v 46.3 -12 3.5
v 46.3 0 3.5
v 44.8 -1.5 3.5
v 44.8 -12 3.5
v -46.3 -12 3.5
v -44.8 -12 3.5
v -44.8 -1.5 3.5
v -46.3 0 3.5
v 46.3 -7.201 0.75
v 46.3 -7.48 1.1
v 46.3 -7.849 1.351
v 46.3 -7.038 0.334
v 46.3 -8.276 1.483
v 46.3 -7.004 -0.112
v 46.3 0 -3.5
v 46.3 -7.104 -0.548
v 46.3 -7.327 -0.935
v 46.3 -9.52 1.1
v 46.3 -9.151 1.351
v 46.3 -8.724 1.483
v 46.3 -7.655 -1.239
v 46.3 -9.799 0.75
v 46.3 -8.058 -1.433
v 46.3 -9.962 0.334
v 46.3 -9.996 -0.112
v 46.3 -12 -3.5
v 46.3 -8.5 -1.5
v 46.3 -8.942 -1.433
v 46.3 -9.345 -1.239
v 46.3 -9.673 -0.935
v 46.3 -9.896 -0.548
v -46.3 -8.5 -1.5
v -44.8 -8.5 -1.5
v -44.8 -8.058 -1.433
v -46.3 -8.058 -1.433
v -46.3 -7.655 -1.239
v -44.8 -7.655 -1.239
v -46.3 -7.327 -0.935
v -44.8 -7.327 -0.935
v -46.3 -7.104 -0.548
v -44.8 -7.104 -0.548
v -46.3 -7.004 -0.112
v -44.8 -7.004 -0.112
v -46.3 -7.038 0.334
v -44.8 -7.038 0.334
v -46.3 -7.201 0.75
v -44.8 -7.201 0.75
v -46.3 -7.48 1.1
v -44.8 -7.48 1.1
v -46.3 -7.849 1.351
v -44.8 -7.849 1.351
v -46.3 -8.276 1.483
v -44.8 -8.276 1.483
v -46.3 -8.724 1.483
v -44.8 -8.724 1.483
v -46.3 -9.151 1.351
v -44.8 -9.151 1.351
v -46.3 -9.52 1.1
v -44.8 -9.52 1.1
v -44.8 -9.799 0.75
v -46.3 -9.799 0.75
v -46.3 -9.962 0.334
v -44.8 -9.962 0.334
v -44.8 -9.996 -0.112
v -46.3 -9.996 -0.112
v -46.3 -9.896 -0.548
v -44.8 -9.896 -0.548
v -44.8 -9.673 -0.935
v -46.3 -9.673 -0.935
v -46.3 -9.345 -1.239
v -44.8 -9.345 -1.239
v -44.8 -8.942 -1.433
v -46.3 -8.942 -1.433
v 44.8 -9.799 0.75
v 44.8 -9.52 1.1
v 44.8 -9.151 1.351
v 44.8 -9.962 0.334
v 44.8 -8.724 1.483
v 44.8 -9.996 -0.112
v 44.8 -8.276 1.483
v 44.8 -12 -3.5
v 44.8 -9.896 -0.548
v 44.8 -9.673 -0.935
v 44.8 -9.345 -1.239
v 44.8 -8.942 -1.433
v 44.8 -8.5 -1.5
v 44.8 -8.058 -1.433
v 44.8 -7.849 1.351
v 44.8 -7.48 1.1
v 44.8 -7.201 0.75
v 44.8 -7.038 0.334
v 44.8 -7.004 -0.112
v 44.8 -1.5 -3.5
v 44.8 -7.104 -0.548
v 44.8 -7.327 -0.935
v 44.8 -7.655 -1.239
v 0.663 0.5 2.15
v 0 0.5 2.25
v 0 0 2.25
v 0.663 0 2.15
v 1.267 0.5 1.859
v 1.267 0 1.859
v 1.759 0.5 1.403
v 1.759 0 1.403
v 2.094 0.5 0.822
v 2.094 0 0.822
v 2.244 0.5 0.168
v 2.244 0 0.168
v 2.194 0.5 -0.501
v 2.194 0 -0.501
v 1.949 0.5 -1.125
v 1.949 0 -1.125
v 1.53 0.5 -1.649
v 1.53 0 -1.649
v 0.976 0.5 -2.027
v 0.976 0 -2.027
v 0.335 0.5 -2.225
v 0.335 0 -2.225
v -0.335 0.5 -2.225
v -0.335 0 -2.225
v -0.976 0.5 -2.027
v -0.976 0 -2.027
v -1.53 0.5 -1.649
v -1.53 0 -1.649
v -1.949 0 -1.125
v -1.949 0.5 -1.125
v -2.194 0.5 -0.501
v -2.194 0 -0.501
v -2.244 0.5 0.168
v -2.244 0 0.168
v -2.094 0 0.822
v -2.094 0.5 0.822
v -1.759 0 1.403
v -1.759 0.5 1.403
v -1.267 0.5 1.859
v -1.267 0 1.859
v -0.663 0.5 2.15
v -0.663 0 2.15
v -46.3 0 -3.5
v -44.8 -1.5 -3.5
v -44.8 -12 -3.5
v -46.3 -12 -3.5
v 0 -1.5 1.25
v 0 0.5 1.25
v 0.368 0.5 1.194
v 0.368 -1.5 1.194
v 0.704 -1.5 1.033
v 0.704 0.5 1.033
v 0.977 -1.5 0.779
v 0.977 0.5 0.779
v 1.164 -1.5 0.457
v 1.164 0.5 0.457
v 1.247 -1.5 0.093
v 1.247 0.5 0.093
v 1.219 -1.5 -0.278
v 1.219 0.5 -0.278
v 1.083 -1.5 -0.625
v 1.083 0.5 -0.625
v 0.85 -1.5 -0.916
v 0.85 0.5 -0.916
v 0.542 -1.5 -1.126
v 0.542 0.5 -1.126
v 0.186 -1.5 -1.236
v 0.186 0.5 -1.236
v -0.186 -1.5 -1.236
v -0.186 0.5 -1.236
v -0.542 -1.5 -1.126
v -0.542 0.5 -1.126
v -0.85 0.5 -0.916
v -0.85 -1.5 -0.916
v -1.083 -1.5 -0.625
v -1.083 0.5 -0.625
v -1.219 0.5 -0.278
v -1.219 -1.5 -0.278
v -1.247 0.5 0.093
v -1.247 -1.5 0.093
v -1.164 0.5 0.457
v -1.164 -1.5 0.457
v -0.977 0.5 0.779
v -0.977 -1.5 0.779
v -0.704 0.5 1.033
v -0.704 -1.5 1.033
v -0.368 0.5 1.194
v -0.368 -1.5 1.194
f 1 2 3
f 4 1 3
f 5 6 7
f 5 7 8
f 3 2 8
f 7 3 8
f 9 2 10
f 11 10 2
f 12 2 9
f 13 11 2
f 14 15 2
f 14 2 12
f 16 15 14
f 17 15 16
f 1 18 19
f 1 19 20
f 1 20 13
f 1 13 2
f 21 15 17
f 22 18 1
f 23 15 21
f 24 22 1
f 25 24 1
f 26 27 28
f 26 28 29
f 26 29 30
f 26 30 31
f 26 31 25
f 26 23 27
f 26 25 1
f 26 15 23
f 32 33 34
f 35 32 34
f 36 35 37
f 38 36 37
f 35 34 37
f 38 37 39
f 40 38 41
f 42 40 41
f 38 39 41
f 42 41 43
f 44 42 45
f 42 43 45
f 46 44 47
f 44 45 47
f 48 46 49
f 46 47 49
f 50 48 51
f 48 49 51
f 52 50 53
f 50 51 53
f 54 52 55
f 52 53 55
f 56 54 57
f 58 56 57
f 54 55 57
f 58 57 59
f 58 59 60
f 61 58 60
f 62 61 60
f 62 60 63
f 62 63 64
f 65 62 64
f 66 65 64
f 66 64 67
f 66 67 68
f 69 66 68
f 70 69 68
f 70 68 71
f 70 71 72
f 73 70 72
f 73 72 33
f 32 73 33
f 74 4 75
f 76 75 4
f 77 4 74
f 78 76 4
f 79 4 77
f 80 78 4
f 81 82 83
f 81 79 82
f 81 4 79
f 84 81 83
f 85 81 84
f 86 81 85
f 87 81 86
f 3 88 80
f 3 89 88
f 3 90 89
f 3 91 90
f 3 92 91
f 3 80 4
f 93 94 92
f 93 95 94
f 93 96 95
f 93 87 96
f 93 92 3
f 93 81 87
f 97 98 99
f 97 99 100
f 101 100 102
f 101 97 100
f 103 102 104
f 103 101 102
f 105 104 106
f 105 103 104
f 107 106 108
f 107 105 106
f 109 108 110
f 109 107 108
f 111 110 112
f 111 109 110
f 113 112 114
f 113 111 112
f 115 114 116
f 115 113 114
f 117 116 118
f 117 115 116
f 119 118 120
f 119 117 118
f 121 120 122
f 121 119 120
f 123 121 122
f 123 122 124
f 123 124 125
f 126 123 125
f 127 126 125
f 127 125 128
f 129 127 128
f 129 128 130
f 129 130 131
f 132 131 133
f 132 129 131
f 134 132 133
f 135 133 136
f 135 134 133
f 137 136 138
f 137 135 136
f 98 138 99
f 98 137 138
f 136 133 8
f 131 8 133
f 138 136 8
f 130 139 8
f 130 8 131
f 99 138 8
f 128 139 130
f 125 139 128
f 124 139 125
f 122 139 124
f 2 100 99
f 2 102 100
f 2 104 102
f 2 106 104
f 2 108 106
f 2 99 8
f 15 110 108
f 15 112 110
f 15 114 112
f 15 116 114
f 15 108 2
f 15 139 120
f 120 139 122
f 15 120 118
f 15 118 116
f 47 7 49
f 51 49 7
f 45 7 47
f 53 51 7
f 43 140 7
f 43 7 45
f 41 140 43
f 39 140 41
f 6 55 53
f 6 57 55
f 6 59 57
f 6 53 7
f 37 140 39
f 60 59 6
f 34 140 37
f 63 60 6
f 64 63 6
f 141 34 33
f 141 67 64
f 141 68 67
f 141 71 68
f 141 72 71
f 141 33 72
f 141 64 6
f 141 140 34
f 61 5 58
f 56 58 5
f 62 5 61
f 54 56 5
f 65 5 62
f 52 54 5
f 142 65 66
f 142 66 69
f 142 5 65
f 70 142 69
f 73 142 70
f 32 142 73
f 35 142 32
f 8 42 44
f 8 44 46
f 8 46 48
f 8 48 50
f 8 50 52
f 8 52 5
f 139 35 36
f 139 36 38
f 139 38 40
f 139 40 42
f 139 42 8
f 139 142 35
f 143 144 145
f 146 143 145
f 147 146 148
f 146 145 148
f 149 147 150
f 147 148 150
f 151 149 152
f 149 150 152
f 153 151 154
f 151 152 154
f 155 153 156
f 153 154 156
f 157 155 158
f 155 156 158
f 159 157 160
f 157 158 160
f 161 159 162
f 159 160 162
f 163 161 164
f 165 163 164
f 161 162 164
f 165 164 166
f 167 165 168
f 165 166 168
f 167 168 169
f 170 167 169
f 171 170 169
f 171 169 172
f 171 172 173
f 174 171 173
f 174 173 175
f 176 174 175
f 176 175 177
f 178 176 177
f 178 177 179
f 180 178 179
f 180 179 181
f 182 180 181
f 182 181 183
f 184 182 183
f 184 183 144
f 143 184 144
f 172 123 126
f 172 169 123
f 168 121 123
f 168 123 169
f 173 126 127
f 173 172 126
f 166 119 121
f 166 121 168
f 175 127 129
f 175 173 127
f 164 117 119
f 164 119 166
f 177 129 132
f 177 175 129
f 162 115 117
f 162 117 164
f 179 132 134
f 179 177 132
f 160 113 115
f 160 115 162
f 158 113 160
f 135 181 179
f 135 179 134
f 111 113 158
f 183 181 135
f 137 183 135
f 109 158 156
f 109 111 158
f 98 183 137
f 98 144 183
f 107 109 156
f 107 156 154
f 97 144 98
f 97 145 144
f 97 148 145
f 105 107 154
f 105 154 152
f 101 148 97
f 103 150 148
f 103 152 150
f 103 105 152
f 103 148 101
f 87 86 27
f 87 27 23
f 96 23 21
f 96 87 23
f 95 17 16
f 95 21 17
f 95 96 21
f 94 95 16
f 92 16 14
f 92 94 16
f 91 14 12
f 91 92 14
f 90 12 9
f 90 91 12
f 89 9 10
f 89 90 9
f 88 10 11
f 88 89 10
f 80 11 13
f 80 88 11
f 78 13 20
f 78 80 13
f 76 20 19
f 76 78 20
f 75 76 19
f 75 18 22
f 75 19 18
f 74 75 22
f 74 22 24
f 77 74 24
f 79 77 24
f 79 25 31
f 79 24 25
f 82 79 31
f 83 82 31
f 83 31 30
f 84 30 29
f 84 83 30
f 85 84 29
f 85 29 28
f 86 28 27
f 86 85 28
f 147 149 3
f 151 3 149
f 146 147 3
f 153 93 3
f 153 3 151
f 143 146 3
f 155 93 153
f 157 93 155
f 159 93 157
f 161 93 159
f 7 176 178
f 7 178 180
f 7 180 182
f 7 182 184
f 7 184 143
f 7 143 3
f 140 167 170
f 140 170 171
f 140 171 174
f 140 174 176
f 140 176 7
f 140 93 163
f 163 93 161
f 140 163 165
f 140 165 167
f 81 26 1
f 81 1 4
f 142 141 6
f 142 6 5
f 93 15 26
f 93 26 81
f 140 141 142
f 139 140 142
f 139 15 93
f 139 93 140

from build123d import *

# Parameters (mm, degrees)
BOSS_EXTRUDE1_DEPTH            = 3.5
BOSS_EXTRUDE1_DEPTH_BACK       = 3.5
SKETCH2_R                      = 1.25
CUT_EXTRUDE1_DEPTH             = 3.5
BOSS_EXTRUDE2_START            = 0.5
SKETCH3_R                      = 2.25
SKETCH3_R_2                    = 1.25
BOSS_EXTRUDE2_DEPTH            = 0.5
CUT_EXTRUDE2_REACH             = 49.958
SKETCH4_R                      = 1.5
CUT_EXTRUDE2_DIRECTION_2_REACH = 49.958


with BuildPart() as part:
    # Sketch1 → Boss-Extrude1 (new, two sides: drawn at the far end of the back side and taken through both)
    with BuildSketch(Plane.XY.offset(-BOSS_EXTRUDE1_DEPTH_BACK)):
        Polygon((-46.3, 0), (46.3, 0), (46.3, -12), (44.8, -12), (44.8, -1.5), (-44.8, -1.5), (-44.8, -12), (-46.3, -12), align=None)
    extrude(amount=BOSS_EXTRUDE1_DEPTH + BOSS_EXTRUDE1_DEPTH_BACK)

    # Sketch2 → Cut-Extrude1 (cut)
    with BuildSketch(Plane(origin=(0, 0, 0), x_dir=(1, 0, 0), z_dir=(0, 1, 0))):
        Circle(SKETCH2_R)
    extrude(amount=-CUT_EXTRUDE1_DEPTH, mode=Mode.SUBTRACT)

    # Sketch3 → Boss-Extrude2 (add)
    with BuildSketch(Plane(origin=(0, 0, 0), x_dir=(1, 0, 0), z_dir=(0, 1, 0)).offset(BOSS_EXTRUDE2_START)):
        Circle(SKETCH3_R)
        Circle(SKETCH3_R_2, mode=Mode.SUBTRACT)
    extrude(amount=-BOSS_EXTRUDE2_DEPTH)

    # Cut-Extrude2: up to this face of the body (flat: up to its plane)
    cut_extrude2_end = Plane(part.part.faces().sort_by_distance((-46.3, -6, 0))[0])
    # Sketch4 → Cut-Extrude2 (cut, up to the picked face)
    with BuildSketch(Plane(origin=(0, 0, 0), x_dir=(0, 0, -1), z_dir=(1, 0, 0)), mode=Mode.PRIVATE) as cut_extrude2_sk1:
        with Locations((0, -8.5)):
            Circle(SKETCH4_R)
    cut_extrude2_tool1 = split(extrude(cut_extrude2_sk1.sketch, amount=-CUT_EXTRUDE2_REACH, mode=Mode.PRIVATE), bisect_by=cut_extrude2_end, keep=Keep.BOTH, mode=Mode.PRIVATE)
    add(cut_extrude2_tool1.solids().sort_by(Axis((0, -8.5, 0), (-1, 0, 0)))[0], mode=Mode.SUBTRACT)

    # Cut-Extrude2 direction 2: up to this face of the body (flat: up to its plane)
    cut_extrude2_direction_2_end = Plane(part.part.faces().sort_by_distance((46.3, -6, 0))[0])
    # Sketch4 → Cut-Extrude2 direction 2 (cut, up to the picked face)
    with BuildSketch(Plane(origin=(0, 0, 0), x_dir=(0, 0, -1), z_dir=(1, 0, 0)), mode=Mode.PRIVATE) as cut_extrude2_direction_2_sk1:
        with Locations((0, -8.5)):
            Circle(SKETCH4_R)
    cut_extrude2_direction_2_tool1 = split(extrude(cut_extrude2_direction_2_sk1.sketch, amount=CUT_EXTRUDE2_DIRECTION_2_REACH, mode=Mode.PRIVATE), bisect_by=cut_extrude2_direction_2_end, keep=Keep.BOTH, mode=Mode.PRIVATE)
    add(cut_extrude2_direction_2_tool1.solids().sort_by(Axis((0, -8.5, 0), (1, 0, 0)))[0], mode=Mode.SUBTRACT)


solid = part.part
